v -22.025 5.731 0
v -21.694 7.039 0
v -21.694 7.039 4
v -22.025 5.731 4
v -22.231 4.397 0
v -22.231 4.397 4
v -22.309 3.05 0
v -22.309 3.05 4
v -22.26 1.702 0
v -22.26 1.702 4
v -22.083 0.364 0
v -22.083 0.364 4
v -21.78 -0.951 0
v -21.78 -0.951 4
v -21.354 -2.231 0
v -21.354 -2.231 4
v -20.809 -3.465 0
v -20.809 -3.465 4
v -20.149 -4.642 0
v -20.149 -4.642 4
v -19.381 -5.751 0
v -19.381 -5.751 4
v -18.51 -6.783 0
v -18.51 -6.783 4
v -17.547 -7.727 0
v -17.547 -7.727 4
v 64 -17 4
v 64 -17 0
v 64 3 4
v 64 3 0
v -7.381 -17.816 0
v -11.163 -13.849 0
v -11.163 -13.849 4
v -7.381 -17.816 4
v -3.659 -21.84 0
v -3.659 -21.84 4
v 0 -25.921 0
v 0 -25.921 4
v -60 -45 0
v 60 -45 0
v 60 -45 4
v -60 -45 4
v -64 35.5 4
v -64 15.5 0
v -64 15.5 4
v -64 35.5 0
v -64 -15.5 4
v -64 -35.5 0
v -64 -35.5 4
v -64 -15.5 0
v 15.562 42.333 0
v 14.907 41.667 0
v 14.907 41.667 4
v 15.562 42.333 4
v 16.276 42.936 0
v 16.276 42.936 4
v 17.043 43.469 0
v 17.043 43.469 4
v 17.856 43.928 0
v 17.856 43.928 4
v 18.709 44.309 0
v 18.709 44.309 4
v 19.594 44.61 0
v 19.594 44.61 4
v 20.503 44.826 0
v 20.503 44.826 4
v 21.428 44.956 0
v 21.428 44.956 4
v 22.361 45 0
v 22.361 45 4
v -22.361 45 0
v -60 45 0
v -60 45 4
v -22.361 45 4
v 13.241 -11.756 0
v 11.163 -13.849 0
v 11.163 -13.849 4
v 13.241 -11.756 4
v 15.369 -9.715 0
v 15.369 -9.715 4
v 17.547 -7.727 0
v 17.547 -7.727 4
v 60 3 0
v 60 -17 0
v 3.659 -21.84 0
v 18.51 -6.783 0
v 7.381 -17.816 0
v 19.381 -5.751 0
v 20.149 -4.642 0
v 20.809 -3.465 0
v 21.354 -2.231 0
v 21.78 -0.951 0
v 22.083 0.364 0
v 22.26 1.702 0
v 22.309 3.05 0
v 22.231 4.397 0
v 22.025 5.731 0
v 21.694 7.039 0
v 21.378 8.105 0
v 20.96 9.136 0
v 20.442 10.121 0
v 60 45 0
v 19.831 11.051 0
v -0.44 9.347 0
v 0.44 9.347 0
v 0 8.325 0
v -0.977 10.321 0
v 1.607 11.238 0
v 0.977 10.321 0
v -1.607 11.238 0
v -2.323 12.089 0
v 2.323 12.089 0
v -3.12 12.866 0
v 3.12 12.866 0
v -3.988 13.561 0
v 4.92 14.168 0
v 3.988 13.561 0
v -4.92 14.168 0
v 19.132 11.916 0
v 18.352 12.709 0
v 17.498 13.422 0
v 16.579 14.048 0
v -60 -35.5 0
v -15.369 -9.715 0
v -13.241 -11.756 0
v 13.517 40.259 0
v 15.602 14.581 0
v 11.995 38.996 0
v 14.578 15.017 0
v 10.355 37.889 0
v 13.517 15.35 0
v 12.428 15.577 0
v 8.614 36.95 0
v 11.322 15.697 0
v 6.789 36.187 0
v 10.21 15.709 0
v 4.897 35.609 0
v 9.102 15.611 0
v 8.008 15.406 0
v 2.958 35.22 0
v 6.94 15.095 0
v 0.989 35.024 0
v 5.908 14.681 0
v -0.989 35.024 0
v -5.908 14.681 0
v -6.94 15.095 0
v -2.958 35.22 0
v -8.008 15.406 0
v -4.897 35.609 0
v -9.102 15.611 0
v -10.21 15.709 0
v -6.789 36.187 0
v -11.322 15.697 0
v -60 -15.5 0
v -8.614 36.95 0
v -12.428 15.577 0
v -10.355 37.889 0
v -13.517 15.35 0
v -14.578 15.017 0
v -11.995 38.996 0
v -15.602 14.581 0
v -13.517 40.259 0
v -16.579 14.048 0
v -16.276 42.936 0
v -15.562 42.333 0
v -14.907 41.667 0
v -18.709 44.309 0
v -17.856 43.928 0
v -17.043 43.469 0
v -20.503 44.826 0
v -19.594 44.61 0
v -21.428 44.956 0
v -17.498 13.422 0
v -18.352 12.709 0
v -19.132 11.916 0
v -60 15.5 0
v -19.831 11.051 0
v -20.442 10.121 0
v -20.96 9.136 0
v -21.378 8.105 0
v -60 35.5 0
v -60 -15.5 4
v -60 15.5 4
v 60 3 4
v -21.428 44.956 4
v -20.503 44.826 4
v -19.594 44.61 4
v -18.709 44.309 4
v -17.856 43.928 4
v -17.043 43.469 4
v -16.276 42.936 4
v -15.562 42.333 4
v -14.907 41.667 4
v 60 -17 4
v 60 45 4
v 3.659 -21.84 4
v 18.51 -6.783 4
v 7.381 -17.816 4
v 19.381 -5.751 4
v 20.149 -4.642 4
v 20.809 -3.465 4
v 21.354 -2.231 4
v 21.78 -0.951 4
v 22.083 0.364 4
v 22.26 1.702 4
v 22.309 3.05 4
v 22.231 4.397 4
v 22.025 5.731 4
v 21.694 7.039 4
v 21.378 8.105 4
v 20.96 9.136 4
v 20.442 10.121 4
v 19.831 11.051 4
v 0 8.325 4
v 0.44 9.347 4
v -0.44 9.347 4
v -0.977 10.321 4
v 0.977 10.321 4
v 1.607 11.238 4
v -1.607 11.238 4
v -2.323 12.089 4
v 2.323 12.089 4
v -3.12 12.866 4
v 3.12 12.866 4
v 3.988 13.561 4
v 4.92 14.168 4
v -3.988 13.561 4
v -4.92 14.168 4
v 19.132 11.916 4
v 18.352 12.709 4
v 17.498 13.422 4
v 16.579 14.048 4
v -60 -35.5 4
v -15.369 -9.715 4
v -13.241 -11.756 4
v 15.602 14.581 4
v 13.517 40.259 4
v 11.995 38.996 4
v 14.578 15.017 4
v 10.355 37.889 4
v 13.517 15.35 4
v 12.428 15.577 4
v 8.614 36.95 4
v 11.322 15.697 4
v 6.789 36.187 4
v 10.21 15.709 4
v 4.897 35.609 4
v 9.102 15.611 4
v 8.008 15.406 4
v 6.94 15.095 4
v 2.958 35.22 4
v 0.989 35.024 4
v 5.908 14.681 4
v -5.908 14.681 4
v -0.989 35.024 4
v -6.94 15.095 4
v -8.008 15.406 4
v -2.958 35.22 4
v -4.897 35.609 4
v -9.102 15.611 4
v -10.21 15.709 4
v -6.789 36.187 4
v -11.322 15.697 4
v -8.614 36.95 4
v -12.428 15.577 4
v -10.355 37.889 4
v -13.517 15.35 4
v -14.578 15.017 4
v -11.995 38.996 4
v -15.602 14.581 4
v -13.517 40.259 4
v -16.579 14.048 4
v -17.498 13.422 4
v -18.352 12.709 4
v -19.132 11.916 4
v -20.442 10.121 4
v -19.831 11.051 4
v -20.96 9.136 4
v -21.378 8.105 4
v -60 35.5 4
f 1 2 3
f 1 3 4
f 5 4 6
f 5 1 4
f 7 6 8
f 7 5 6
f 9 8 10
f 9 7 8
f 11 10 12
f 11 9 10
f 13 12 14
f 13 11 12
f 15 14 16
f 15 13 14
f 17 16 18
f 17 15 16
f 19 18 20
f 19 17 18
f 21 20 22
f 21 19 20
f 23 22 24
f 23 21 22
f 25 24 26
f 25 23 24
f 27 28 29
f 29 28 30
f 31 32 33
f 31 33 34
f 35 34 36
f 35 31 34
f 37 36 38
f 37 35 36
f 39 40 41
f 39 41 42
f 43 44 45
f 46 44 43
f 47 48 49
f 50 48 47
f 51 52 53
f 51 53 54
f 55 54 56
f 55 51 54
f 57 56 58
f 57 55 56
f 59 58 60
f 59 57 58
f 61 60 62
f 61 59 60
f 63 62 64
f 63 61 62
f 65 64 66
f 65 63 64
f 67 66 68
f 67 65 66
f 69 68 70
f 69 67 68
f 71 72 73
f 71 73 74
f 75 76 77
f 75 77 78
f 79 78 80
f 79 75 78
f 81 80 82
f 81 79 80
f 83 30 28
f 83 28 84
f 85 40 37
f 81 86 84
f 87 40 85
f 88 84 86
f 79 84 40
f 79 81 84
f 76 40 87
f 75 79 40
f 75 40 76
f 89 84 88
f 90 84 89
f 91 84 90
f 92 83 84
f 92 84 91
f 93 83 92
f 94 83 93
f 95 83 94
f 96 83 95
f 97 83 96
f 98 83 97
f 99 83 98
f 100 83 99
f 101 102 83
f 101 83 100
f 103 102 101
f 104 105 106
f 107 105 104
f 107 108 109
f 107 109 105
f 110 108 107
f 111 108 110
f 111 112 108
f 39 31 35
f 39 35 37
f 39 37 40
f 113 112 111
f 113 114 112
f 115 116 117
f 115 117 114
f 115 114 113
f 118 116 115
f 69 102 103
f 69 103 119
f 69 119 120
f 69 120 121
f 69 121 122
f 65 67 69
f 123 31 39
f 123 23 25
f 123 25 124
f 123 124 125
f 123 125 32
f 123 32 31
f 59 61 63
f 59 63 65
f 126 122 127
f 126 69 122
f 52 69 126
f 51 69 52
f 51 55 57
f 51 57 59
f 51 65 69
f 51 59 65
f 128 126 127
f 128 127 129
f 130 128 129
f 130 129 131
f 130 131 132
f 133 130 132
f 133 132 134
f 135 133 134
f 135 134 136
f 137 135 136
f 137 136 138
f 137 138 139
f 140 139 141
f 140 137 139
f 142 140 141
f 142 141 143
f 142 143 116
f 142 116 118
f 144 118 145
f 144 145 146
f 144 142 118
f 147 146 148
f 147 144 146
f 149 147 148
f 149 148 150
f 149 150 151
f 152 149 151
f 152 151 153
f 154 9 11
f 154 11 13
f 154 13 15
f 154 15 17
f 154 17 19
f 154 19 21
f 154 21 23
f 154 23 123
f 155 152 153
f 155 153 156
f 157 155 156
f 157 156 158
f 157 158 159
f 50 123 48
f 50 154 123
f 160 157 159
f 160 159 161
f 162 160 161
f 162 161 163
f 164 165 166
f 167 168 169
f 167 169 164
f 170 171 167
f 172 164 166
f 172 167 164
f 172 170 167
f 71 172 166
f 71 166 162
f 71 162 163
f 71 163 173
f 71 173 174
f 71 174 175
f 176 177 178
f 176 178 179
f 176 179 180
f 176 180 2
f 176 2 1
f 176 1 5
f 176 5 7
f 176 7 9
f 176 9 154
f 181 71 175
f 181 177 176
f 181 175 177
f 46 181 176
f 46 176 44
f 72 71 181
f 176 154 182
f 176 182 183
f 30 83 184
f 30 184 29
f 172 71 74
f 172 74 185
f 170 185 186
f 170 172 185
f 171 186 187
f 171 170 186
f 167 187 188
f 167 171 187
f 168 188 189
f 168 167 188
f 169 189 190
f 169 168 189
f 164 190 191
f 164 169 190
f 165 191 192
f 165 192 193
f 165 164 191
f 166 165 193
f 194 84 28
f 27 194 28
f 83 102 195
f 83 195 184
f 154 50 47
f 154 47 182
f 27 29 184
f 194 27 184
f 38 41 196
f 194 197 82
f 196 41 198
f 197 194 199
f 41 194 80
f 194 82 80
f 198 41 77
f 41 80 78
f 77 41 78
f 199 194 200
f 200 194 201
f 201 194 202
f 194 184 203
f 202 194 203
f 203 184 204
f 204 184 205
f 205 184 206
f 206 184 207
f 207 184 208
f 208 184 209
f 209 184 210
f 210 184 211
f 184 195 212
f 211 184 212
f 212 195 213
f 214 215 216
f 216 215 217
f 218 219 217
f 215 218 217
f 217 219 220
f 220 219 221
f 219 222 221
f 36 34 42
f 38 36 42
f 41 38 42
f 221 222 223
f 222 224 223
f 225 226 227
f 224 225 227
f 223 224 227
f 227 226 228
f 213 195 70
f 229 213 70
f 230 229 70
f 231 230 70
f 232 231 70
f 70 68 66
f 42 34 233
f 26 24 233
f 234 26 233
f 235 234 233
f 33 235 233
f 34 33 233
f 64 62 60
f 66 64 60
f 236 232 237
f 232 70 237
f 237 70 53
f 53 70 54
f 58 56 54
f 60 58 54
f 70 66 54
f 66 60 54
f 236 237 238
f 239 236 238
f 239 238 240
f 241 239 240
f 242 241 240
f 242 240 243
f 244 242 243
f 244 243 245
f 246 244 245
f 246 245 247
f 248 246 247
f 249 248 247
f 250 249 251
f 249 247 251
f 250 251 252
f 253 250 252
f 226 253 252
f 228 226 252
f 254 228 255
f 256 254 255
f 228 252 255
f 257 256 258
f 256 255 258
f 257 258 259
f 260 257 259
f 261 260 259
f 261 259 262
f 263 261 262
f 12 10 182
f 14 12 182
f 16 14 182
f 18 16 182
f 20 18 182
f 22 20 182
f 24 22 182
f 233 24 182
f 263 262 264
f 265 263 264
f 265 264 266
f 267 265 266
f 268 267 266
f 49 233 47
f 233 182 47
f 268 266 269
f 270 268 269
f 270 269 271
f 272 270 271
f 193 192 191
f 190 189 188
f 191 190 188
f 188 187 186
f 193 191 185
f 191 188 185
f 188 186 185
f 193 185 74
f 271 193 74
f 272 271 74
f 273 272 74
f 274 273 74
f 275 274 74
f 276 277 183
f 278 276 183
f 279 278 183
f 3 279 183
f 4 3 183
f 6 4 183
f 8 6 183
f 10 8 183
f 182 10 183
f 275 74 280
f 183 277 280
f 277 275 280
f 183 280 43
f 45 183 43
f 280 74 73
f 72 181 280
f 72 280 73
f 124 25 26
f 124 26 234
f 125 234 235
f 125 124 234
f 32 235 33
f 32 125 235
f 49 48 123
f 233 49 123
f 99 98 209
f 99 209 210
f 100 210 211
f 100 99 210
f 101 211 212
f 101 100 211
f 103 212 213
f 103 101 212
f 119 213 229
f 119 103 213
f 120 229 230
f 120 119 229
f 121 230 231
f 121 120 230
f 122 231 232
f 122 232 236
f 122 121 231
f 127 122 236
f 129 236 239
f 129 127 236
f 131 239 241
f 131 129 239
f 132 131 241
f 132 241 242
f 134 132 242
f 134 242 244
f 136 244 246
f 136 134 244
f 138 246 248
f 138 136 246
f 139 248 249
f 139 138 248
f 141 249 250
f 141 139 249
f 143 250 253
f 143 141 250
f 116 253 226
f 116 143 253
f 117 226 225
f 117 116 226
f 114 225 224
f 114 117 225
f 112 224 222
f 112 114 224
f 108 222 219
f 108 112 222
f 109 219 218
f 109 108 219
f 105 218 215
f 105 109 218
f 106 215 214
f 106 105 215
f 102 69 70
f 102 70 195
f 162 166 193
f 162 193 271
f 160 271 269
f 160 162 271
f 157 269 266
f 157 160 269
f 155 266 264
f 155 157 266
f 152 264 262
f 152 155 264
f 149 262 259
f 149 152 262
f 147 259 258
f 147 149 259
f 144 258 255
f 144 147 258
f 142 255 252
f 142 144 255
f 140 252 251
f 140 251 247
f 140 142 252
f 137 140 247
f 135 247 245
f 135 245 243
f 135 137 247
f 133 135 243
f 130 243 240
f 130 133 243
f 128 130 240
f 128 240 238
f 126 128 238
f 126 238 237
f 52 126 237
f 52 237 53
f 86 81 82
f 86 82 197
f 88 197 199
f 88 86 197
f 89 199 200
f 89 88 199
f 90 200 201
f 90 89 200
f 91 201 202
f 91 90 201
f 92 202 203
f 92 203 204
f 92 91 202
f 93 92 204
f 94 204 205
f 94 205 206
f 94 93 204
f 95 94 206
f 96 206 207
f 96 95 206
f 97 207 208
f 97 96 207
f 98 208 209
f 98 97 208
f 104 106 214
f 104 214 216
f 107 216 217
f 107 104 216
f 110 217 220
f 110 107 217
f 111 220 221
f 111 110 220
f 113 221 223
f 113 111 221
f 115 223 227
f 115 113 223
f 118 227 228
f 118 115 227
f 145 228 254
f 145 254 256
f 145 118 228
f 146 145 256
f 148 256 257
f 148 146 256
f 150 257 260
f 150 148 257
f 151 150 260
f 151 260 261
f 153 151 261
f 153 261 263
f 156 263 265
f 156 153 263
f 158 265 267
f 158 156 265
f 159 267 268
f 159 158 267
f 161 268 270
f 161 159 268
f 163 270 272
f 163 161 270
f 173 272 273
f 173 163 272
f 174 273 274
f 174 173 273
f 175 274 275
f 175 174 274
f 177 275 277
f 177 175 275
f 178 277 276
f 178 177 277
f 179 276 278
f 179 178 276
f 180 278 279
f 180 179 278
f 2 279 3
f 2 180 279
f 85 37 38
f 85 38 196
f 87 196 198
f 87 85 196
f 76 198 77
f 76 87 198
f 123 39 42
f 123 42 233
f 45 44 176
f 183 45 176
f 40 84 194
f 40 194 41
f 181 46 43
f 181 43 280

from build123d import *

# Parameters (mm, degrees)
SKETCH_1_W      = 4
SKETCH_1_H      = 20
EXTRUDE_1_DEPTH = 4


with BuildPart() as part:
    # Эскиз1 → Бобышка-Вытянуть1 (new body)
    # profile 1 of 4: a face of its own
    with BuildSketch(Plane.XY):
        with BuildLine():
            Line((-60, 45), (-22.360679775, 45))
            ThreePointArc((-22.360679775, 45), (-18.27819687, 44.128709292), (-14.90711985, 41.666666667))
            ThreePointArc((-14.90711985, 41.666666667), (0, 35), (14.90711985, 41.666666667))
            ThreePointArc((14.90711985, 41.666666667), (18.27819687, 44.128709292), (22.360679775, 45))
            Line((22.360679775, 45), (60, 45))
            Line((60, 45), (60, -45))
            Line((60, -45), (-60, -45))
            Line((-60, -45), (-60, 45))
        make_face()
        with BuildLine():
            ThreePointArc((0, 8.325008306), (-11.322126202, 15.697320009), (-21.693624825, 7.038593896))
            ThreePointArc((-21.693624825, 7.038593896), (-21.780397742, -0.950934053), (-17.546591805, -7.726992913))
            ThreePointArc((-17.546591805, -7.726992913), (-14.298596462, -10.729197825), (-11.163444206, -13.849058145))
            ThreePointArc((-11.163444206, -13.849058145), (-5.512041052, -19.820511257), (0, -25.920840209))
            ThreePointArc((0, -25.920840209), (5.512041052, -19.820511257), (11.163444206, -13.849058145))
            ThreePointArc((11.163444206, -13.849058145), (14.298596462, -10.729197825), (17.546591805, -7.726992913))
            ThreePointArc((17.546591805, -7.726992913), (21.780397742, -0.950934053), (21.693624825, 7.038593896))
            ThreePointArc((21.693624825, 7.038593896), (11.322126202, 15.697320009), (0, 8.325008306))
        make_face(mode=Mode.SUBTRACT)
    # profile 2 of 4: a face of its own
    with BuildSketch(Plane.XY):
        with Locations((-62, -25.5)):
            Rectangle(SKETCH_1_W, SKETCH_1_H)
    # profile 3 of 4: a face of its own
    with BuildSketch(Plane.XY):
        with Locations((-62, 25.5)):
            Rectangle(SKETCH_1_W, SKETCH_1_H)
    # profile 4 of 4: a face of its own
    with BuildSketch(Plane.XY):
        with Locations((62, -7)):
            Rectangle(SKETCH_1_W, SKETCH_1_H)
    extrude(amount=EXTRUDE_1_DEPTH)


solid = part.part
